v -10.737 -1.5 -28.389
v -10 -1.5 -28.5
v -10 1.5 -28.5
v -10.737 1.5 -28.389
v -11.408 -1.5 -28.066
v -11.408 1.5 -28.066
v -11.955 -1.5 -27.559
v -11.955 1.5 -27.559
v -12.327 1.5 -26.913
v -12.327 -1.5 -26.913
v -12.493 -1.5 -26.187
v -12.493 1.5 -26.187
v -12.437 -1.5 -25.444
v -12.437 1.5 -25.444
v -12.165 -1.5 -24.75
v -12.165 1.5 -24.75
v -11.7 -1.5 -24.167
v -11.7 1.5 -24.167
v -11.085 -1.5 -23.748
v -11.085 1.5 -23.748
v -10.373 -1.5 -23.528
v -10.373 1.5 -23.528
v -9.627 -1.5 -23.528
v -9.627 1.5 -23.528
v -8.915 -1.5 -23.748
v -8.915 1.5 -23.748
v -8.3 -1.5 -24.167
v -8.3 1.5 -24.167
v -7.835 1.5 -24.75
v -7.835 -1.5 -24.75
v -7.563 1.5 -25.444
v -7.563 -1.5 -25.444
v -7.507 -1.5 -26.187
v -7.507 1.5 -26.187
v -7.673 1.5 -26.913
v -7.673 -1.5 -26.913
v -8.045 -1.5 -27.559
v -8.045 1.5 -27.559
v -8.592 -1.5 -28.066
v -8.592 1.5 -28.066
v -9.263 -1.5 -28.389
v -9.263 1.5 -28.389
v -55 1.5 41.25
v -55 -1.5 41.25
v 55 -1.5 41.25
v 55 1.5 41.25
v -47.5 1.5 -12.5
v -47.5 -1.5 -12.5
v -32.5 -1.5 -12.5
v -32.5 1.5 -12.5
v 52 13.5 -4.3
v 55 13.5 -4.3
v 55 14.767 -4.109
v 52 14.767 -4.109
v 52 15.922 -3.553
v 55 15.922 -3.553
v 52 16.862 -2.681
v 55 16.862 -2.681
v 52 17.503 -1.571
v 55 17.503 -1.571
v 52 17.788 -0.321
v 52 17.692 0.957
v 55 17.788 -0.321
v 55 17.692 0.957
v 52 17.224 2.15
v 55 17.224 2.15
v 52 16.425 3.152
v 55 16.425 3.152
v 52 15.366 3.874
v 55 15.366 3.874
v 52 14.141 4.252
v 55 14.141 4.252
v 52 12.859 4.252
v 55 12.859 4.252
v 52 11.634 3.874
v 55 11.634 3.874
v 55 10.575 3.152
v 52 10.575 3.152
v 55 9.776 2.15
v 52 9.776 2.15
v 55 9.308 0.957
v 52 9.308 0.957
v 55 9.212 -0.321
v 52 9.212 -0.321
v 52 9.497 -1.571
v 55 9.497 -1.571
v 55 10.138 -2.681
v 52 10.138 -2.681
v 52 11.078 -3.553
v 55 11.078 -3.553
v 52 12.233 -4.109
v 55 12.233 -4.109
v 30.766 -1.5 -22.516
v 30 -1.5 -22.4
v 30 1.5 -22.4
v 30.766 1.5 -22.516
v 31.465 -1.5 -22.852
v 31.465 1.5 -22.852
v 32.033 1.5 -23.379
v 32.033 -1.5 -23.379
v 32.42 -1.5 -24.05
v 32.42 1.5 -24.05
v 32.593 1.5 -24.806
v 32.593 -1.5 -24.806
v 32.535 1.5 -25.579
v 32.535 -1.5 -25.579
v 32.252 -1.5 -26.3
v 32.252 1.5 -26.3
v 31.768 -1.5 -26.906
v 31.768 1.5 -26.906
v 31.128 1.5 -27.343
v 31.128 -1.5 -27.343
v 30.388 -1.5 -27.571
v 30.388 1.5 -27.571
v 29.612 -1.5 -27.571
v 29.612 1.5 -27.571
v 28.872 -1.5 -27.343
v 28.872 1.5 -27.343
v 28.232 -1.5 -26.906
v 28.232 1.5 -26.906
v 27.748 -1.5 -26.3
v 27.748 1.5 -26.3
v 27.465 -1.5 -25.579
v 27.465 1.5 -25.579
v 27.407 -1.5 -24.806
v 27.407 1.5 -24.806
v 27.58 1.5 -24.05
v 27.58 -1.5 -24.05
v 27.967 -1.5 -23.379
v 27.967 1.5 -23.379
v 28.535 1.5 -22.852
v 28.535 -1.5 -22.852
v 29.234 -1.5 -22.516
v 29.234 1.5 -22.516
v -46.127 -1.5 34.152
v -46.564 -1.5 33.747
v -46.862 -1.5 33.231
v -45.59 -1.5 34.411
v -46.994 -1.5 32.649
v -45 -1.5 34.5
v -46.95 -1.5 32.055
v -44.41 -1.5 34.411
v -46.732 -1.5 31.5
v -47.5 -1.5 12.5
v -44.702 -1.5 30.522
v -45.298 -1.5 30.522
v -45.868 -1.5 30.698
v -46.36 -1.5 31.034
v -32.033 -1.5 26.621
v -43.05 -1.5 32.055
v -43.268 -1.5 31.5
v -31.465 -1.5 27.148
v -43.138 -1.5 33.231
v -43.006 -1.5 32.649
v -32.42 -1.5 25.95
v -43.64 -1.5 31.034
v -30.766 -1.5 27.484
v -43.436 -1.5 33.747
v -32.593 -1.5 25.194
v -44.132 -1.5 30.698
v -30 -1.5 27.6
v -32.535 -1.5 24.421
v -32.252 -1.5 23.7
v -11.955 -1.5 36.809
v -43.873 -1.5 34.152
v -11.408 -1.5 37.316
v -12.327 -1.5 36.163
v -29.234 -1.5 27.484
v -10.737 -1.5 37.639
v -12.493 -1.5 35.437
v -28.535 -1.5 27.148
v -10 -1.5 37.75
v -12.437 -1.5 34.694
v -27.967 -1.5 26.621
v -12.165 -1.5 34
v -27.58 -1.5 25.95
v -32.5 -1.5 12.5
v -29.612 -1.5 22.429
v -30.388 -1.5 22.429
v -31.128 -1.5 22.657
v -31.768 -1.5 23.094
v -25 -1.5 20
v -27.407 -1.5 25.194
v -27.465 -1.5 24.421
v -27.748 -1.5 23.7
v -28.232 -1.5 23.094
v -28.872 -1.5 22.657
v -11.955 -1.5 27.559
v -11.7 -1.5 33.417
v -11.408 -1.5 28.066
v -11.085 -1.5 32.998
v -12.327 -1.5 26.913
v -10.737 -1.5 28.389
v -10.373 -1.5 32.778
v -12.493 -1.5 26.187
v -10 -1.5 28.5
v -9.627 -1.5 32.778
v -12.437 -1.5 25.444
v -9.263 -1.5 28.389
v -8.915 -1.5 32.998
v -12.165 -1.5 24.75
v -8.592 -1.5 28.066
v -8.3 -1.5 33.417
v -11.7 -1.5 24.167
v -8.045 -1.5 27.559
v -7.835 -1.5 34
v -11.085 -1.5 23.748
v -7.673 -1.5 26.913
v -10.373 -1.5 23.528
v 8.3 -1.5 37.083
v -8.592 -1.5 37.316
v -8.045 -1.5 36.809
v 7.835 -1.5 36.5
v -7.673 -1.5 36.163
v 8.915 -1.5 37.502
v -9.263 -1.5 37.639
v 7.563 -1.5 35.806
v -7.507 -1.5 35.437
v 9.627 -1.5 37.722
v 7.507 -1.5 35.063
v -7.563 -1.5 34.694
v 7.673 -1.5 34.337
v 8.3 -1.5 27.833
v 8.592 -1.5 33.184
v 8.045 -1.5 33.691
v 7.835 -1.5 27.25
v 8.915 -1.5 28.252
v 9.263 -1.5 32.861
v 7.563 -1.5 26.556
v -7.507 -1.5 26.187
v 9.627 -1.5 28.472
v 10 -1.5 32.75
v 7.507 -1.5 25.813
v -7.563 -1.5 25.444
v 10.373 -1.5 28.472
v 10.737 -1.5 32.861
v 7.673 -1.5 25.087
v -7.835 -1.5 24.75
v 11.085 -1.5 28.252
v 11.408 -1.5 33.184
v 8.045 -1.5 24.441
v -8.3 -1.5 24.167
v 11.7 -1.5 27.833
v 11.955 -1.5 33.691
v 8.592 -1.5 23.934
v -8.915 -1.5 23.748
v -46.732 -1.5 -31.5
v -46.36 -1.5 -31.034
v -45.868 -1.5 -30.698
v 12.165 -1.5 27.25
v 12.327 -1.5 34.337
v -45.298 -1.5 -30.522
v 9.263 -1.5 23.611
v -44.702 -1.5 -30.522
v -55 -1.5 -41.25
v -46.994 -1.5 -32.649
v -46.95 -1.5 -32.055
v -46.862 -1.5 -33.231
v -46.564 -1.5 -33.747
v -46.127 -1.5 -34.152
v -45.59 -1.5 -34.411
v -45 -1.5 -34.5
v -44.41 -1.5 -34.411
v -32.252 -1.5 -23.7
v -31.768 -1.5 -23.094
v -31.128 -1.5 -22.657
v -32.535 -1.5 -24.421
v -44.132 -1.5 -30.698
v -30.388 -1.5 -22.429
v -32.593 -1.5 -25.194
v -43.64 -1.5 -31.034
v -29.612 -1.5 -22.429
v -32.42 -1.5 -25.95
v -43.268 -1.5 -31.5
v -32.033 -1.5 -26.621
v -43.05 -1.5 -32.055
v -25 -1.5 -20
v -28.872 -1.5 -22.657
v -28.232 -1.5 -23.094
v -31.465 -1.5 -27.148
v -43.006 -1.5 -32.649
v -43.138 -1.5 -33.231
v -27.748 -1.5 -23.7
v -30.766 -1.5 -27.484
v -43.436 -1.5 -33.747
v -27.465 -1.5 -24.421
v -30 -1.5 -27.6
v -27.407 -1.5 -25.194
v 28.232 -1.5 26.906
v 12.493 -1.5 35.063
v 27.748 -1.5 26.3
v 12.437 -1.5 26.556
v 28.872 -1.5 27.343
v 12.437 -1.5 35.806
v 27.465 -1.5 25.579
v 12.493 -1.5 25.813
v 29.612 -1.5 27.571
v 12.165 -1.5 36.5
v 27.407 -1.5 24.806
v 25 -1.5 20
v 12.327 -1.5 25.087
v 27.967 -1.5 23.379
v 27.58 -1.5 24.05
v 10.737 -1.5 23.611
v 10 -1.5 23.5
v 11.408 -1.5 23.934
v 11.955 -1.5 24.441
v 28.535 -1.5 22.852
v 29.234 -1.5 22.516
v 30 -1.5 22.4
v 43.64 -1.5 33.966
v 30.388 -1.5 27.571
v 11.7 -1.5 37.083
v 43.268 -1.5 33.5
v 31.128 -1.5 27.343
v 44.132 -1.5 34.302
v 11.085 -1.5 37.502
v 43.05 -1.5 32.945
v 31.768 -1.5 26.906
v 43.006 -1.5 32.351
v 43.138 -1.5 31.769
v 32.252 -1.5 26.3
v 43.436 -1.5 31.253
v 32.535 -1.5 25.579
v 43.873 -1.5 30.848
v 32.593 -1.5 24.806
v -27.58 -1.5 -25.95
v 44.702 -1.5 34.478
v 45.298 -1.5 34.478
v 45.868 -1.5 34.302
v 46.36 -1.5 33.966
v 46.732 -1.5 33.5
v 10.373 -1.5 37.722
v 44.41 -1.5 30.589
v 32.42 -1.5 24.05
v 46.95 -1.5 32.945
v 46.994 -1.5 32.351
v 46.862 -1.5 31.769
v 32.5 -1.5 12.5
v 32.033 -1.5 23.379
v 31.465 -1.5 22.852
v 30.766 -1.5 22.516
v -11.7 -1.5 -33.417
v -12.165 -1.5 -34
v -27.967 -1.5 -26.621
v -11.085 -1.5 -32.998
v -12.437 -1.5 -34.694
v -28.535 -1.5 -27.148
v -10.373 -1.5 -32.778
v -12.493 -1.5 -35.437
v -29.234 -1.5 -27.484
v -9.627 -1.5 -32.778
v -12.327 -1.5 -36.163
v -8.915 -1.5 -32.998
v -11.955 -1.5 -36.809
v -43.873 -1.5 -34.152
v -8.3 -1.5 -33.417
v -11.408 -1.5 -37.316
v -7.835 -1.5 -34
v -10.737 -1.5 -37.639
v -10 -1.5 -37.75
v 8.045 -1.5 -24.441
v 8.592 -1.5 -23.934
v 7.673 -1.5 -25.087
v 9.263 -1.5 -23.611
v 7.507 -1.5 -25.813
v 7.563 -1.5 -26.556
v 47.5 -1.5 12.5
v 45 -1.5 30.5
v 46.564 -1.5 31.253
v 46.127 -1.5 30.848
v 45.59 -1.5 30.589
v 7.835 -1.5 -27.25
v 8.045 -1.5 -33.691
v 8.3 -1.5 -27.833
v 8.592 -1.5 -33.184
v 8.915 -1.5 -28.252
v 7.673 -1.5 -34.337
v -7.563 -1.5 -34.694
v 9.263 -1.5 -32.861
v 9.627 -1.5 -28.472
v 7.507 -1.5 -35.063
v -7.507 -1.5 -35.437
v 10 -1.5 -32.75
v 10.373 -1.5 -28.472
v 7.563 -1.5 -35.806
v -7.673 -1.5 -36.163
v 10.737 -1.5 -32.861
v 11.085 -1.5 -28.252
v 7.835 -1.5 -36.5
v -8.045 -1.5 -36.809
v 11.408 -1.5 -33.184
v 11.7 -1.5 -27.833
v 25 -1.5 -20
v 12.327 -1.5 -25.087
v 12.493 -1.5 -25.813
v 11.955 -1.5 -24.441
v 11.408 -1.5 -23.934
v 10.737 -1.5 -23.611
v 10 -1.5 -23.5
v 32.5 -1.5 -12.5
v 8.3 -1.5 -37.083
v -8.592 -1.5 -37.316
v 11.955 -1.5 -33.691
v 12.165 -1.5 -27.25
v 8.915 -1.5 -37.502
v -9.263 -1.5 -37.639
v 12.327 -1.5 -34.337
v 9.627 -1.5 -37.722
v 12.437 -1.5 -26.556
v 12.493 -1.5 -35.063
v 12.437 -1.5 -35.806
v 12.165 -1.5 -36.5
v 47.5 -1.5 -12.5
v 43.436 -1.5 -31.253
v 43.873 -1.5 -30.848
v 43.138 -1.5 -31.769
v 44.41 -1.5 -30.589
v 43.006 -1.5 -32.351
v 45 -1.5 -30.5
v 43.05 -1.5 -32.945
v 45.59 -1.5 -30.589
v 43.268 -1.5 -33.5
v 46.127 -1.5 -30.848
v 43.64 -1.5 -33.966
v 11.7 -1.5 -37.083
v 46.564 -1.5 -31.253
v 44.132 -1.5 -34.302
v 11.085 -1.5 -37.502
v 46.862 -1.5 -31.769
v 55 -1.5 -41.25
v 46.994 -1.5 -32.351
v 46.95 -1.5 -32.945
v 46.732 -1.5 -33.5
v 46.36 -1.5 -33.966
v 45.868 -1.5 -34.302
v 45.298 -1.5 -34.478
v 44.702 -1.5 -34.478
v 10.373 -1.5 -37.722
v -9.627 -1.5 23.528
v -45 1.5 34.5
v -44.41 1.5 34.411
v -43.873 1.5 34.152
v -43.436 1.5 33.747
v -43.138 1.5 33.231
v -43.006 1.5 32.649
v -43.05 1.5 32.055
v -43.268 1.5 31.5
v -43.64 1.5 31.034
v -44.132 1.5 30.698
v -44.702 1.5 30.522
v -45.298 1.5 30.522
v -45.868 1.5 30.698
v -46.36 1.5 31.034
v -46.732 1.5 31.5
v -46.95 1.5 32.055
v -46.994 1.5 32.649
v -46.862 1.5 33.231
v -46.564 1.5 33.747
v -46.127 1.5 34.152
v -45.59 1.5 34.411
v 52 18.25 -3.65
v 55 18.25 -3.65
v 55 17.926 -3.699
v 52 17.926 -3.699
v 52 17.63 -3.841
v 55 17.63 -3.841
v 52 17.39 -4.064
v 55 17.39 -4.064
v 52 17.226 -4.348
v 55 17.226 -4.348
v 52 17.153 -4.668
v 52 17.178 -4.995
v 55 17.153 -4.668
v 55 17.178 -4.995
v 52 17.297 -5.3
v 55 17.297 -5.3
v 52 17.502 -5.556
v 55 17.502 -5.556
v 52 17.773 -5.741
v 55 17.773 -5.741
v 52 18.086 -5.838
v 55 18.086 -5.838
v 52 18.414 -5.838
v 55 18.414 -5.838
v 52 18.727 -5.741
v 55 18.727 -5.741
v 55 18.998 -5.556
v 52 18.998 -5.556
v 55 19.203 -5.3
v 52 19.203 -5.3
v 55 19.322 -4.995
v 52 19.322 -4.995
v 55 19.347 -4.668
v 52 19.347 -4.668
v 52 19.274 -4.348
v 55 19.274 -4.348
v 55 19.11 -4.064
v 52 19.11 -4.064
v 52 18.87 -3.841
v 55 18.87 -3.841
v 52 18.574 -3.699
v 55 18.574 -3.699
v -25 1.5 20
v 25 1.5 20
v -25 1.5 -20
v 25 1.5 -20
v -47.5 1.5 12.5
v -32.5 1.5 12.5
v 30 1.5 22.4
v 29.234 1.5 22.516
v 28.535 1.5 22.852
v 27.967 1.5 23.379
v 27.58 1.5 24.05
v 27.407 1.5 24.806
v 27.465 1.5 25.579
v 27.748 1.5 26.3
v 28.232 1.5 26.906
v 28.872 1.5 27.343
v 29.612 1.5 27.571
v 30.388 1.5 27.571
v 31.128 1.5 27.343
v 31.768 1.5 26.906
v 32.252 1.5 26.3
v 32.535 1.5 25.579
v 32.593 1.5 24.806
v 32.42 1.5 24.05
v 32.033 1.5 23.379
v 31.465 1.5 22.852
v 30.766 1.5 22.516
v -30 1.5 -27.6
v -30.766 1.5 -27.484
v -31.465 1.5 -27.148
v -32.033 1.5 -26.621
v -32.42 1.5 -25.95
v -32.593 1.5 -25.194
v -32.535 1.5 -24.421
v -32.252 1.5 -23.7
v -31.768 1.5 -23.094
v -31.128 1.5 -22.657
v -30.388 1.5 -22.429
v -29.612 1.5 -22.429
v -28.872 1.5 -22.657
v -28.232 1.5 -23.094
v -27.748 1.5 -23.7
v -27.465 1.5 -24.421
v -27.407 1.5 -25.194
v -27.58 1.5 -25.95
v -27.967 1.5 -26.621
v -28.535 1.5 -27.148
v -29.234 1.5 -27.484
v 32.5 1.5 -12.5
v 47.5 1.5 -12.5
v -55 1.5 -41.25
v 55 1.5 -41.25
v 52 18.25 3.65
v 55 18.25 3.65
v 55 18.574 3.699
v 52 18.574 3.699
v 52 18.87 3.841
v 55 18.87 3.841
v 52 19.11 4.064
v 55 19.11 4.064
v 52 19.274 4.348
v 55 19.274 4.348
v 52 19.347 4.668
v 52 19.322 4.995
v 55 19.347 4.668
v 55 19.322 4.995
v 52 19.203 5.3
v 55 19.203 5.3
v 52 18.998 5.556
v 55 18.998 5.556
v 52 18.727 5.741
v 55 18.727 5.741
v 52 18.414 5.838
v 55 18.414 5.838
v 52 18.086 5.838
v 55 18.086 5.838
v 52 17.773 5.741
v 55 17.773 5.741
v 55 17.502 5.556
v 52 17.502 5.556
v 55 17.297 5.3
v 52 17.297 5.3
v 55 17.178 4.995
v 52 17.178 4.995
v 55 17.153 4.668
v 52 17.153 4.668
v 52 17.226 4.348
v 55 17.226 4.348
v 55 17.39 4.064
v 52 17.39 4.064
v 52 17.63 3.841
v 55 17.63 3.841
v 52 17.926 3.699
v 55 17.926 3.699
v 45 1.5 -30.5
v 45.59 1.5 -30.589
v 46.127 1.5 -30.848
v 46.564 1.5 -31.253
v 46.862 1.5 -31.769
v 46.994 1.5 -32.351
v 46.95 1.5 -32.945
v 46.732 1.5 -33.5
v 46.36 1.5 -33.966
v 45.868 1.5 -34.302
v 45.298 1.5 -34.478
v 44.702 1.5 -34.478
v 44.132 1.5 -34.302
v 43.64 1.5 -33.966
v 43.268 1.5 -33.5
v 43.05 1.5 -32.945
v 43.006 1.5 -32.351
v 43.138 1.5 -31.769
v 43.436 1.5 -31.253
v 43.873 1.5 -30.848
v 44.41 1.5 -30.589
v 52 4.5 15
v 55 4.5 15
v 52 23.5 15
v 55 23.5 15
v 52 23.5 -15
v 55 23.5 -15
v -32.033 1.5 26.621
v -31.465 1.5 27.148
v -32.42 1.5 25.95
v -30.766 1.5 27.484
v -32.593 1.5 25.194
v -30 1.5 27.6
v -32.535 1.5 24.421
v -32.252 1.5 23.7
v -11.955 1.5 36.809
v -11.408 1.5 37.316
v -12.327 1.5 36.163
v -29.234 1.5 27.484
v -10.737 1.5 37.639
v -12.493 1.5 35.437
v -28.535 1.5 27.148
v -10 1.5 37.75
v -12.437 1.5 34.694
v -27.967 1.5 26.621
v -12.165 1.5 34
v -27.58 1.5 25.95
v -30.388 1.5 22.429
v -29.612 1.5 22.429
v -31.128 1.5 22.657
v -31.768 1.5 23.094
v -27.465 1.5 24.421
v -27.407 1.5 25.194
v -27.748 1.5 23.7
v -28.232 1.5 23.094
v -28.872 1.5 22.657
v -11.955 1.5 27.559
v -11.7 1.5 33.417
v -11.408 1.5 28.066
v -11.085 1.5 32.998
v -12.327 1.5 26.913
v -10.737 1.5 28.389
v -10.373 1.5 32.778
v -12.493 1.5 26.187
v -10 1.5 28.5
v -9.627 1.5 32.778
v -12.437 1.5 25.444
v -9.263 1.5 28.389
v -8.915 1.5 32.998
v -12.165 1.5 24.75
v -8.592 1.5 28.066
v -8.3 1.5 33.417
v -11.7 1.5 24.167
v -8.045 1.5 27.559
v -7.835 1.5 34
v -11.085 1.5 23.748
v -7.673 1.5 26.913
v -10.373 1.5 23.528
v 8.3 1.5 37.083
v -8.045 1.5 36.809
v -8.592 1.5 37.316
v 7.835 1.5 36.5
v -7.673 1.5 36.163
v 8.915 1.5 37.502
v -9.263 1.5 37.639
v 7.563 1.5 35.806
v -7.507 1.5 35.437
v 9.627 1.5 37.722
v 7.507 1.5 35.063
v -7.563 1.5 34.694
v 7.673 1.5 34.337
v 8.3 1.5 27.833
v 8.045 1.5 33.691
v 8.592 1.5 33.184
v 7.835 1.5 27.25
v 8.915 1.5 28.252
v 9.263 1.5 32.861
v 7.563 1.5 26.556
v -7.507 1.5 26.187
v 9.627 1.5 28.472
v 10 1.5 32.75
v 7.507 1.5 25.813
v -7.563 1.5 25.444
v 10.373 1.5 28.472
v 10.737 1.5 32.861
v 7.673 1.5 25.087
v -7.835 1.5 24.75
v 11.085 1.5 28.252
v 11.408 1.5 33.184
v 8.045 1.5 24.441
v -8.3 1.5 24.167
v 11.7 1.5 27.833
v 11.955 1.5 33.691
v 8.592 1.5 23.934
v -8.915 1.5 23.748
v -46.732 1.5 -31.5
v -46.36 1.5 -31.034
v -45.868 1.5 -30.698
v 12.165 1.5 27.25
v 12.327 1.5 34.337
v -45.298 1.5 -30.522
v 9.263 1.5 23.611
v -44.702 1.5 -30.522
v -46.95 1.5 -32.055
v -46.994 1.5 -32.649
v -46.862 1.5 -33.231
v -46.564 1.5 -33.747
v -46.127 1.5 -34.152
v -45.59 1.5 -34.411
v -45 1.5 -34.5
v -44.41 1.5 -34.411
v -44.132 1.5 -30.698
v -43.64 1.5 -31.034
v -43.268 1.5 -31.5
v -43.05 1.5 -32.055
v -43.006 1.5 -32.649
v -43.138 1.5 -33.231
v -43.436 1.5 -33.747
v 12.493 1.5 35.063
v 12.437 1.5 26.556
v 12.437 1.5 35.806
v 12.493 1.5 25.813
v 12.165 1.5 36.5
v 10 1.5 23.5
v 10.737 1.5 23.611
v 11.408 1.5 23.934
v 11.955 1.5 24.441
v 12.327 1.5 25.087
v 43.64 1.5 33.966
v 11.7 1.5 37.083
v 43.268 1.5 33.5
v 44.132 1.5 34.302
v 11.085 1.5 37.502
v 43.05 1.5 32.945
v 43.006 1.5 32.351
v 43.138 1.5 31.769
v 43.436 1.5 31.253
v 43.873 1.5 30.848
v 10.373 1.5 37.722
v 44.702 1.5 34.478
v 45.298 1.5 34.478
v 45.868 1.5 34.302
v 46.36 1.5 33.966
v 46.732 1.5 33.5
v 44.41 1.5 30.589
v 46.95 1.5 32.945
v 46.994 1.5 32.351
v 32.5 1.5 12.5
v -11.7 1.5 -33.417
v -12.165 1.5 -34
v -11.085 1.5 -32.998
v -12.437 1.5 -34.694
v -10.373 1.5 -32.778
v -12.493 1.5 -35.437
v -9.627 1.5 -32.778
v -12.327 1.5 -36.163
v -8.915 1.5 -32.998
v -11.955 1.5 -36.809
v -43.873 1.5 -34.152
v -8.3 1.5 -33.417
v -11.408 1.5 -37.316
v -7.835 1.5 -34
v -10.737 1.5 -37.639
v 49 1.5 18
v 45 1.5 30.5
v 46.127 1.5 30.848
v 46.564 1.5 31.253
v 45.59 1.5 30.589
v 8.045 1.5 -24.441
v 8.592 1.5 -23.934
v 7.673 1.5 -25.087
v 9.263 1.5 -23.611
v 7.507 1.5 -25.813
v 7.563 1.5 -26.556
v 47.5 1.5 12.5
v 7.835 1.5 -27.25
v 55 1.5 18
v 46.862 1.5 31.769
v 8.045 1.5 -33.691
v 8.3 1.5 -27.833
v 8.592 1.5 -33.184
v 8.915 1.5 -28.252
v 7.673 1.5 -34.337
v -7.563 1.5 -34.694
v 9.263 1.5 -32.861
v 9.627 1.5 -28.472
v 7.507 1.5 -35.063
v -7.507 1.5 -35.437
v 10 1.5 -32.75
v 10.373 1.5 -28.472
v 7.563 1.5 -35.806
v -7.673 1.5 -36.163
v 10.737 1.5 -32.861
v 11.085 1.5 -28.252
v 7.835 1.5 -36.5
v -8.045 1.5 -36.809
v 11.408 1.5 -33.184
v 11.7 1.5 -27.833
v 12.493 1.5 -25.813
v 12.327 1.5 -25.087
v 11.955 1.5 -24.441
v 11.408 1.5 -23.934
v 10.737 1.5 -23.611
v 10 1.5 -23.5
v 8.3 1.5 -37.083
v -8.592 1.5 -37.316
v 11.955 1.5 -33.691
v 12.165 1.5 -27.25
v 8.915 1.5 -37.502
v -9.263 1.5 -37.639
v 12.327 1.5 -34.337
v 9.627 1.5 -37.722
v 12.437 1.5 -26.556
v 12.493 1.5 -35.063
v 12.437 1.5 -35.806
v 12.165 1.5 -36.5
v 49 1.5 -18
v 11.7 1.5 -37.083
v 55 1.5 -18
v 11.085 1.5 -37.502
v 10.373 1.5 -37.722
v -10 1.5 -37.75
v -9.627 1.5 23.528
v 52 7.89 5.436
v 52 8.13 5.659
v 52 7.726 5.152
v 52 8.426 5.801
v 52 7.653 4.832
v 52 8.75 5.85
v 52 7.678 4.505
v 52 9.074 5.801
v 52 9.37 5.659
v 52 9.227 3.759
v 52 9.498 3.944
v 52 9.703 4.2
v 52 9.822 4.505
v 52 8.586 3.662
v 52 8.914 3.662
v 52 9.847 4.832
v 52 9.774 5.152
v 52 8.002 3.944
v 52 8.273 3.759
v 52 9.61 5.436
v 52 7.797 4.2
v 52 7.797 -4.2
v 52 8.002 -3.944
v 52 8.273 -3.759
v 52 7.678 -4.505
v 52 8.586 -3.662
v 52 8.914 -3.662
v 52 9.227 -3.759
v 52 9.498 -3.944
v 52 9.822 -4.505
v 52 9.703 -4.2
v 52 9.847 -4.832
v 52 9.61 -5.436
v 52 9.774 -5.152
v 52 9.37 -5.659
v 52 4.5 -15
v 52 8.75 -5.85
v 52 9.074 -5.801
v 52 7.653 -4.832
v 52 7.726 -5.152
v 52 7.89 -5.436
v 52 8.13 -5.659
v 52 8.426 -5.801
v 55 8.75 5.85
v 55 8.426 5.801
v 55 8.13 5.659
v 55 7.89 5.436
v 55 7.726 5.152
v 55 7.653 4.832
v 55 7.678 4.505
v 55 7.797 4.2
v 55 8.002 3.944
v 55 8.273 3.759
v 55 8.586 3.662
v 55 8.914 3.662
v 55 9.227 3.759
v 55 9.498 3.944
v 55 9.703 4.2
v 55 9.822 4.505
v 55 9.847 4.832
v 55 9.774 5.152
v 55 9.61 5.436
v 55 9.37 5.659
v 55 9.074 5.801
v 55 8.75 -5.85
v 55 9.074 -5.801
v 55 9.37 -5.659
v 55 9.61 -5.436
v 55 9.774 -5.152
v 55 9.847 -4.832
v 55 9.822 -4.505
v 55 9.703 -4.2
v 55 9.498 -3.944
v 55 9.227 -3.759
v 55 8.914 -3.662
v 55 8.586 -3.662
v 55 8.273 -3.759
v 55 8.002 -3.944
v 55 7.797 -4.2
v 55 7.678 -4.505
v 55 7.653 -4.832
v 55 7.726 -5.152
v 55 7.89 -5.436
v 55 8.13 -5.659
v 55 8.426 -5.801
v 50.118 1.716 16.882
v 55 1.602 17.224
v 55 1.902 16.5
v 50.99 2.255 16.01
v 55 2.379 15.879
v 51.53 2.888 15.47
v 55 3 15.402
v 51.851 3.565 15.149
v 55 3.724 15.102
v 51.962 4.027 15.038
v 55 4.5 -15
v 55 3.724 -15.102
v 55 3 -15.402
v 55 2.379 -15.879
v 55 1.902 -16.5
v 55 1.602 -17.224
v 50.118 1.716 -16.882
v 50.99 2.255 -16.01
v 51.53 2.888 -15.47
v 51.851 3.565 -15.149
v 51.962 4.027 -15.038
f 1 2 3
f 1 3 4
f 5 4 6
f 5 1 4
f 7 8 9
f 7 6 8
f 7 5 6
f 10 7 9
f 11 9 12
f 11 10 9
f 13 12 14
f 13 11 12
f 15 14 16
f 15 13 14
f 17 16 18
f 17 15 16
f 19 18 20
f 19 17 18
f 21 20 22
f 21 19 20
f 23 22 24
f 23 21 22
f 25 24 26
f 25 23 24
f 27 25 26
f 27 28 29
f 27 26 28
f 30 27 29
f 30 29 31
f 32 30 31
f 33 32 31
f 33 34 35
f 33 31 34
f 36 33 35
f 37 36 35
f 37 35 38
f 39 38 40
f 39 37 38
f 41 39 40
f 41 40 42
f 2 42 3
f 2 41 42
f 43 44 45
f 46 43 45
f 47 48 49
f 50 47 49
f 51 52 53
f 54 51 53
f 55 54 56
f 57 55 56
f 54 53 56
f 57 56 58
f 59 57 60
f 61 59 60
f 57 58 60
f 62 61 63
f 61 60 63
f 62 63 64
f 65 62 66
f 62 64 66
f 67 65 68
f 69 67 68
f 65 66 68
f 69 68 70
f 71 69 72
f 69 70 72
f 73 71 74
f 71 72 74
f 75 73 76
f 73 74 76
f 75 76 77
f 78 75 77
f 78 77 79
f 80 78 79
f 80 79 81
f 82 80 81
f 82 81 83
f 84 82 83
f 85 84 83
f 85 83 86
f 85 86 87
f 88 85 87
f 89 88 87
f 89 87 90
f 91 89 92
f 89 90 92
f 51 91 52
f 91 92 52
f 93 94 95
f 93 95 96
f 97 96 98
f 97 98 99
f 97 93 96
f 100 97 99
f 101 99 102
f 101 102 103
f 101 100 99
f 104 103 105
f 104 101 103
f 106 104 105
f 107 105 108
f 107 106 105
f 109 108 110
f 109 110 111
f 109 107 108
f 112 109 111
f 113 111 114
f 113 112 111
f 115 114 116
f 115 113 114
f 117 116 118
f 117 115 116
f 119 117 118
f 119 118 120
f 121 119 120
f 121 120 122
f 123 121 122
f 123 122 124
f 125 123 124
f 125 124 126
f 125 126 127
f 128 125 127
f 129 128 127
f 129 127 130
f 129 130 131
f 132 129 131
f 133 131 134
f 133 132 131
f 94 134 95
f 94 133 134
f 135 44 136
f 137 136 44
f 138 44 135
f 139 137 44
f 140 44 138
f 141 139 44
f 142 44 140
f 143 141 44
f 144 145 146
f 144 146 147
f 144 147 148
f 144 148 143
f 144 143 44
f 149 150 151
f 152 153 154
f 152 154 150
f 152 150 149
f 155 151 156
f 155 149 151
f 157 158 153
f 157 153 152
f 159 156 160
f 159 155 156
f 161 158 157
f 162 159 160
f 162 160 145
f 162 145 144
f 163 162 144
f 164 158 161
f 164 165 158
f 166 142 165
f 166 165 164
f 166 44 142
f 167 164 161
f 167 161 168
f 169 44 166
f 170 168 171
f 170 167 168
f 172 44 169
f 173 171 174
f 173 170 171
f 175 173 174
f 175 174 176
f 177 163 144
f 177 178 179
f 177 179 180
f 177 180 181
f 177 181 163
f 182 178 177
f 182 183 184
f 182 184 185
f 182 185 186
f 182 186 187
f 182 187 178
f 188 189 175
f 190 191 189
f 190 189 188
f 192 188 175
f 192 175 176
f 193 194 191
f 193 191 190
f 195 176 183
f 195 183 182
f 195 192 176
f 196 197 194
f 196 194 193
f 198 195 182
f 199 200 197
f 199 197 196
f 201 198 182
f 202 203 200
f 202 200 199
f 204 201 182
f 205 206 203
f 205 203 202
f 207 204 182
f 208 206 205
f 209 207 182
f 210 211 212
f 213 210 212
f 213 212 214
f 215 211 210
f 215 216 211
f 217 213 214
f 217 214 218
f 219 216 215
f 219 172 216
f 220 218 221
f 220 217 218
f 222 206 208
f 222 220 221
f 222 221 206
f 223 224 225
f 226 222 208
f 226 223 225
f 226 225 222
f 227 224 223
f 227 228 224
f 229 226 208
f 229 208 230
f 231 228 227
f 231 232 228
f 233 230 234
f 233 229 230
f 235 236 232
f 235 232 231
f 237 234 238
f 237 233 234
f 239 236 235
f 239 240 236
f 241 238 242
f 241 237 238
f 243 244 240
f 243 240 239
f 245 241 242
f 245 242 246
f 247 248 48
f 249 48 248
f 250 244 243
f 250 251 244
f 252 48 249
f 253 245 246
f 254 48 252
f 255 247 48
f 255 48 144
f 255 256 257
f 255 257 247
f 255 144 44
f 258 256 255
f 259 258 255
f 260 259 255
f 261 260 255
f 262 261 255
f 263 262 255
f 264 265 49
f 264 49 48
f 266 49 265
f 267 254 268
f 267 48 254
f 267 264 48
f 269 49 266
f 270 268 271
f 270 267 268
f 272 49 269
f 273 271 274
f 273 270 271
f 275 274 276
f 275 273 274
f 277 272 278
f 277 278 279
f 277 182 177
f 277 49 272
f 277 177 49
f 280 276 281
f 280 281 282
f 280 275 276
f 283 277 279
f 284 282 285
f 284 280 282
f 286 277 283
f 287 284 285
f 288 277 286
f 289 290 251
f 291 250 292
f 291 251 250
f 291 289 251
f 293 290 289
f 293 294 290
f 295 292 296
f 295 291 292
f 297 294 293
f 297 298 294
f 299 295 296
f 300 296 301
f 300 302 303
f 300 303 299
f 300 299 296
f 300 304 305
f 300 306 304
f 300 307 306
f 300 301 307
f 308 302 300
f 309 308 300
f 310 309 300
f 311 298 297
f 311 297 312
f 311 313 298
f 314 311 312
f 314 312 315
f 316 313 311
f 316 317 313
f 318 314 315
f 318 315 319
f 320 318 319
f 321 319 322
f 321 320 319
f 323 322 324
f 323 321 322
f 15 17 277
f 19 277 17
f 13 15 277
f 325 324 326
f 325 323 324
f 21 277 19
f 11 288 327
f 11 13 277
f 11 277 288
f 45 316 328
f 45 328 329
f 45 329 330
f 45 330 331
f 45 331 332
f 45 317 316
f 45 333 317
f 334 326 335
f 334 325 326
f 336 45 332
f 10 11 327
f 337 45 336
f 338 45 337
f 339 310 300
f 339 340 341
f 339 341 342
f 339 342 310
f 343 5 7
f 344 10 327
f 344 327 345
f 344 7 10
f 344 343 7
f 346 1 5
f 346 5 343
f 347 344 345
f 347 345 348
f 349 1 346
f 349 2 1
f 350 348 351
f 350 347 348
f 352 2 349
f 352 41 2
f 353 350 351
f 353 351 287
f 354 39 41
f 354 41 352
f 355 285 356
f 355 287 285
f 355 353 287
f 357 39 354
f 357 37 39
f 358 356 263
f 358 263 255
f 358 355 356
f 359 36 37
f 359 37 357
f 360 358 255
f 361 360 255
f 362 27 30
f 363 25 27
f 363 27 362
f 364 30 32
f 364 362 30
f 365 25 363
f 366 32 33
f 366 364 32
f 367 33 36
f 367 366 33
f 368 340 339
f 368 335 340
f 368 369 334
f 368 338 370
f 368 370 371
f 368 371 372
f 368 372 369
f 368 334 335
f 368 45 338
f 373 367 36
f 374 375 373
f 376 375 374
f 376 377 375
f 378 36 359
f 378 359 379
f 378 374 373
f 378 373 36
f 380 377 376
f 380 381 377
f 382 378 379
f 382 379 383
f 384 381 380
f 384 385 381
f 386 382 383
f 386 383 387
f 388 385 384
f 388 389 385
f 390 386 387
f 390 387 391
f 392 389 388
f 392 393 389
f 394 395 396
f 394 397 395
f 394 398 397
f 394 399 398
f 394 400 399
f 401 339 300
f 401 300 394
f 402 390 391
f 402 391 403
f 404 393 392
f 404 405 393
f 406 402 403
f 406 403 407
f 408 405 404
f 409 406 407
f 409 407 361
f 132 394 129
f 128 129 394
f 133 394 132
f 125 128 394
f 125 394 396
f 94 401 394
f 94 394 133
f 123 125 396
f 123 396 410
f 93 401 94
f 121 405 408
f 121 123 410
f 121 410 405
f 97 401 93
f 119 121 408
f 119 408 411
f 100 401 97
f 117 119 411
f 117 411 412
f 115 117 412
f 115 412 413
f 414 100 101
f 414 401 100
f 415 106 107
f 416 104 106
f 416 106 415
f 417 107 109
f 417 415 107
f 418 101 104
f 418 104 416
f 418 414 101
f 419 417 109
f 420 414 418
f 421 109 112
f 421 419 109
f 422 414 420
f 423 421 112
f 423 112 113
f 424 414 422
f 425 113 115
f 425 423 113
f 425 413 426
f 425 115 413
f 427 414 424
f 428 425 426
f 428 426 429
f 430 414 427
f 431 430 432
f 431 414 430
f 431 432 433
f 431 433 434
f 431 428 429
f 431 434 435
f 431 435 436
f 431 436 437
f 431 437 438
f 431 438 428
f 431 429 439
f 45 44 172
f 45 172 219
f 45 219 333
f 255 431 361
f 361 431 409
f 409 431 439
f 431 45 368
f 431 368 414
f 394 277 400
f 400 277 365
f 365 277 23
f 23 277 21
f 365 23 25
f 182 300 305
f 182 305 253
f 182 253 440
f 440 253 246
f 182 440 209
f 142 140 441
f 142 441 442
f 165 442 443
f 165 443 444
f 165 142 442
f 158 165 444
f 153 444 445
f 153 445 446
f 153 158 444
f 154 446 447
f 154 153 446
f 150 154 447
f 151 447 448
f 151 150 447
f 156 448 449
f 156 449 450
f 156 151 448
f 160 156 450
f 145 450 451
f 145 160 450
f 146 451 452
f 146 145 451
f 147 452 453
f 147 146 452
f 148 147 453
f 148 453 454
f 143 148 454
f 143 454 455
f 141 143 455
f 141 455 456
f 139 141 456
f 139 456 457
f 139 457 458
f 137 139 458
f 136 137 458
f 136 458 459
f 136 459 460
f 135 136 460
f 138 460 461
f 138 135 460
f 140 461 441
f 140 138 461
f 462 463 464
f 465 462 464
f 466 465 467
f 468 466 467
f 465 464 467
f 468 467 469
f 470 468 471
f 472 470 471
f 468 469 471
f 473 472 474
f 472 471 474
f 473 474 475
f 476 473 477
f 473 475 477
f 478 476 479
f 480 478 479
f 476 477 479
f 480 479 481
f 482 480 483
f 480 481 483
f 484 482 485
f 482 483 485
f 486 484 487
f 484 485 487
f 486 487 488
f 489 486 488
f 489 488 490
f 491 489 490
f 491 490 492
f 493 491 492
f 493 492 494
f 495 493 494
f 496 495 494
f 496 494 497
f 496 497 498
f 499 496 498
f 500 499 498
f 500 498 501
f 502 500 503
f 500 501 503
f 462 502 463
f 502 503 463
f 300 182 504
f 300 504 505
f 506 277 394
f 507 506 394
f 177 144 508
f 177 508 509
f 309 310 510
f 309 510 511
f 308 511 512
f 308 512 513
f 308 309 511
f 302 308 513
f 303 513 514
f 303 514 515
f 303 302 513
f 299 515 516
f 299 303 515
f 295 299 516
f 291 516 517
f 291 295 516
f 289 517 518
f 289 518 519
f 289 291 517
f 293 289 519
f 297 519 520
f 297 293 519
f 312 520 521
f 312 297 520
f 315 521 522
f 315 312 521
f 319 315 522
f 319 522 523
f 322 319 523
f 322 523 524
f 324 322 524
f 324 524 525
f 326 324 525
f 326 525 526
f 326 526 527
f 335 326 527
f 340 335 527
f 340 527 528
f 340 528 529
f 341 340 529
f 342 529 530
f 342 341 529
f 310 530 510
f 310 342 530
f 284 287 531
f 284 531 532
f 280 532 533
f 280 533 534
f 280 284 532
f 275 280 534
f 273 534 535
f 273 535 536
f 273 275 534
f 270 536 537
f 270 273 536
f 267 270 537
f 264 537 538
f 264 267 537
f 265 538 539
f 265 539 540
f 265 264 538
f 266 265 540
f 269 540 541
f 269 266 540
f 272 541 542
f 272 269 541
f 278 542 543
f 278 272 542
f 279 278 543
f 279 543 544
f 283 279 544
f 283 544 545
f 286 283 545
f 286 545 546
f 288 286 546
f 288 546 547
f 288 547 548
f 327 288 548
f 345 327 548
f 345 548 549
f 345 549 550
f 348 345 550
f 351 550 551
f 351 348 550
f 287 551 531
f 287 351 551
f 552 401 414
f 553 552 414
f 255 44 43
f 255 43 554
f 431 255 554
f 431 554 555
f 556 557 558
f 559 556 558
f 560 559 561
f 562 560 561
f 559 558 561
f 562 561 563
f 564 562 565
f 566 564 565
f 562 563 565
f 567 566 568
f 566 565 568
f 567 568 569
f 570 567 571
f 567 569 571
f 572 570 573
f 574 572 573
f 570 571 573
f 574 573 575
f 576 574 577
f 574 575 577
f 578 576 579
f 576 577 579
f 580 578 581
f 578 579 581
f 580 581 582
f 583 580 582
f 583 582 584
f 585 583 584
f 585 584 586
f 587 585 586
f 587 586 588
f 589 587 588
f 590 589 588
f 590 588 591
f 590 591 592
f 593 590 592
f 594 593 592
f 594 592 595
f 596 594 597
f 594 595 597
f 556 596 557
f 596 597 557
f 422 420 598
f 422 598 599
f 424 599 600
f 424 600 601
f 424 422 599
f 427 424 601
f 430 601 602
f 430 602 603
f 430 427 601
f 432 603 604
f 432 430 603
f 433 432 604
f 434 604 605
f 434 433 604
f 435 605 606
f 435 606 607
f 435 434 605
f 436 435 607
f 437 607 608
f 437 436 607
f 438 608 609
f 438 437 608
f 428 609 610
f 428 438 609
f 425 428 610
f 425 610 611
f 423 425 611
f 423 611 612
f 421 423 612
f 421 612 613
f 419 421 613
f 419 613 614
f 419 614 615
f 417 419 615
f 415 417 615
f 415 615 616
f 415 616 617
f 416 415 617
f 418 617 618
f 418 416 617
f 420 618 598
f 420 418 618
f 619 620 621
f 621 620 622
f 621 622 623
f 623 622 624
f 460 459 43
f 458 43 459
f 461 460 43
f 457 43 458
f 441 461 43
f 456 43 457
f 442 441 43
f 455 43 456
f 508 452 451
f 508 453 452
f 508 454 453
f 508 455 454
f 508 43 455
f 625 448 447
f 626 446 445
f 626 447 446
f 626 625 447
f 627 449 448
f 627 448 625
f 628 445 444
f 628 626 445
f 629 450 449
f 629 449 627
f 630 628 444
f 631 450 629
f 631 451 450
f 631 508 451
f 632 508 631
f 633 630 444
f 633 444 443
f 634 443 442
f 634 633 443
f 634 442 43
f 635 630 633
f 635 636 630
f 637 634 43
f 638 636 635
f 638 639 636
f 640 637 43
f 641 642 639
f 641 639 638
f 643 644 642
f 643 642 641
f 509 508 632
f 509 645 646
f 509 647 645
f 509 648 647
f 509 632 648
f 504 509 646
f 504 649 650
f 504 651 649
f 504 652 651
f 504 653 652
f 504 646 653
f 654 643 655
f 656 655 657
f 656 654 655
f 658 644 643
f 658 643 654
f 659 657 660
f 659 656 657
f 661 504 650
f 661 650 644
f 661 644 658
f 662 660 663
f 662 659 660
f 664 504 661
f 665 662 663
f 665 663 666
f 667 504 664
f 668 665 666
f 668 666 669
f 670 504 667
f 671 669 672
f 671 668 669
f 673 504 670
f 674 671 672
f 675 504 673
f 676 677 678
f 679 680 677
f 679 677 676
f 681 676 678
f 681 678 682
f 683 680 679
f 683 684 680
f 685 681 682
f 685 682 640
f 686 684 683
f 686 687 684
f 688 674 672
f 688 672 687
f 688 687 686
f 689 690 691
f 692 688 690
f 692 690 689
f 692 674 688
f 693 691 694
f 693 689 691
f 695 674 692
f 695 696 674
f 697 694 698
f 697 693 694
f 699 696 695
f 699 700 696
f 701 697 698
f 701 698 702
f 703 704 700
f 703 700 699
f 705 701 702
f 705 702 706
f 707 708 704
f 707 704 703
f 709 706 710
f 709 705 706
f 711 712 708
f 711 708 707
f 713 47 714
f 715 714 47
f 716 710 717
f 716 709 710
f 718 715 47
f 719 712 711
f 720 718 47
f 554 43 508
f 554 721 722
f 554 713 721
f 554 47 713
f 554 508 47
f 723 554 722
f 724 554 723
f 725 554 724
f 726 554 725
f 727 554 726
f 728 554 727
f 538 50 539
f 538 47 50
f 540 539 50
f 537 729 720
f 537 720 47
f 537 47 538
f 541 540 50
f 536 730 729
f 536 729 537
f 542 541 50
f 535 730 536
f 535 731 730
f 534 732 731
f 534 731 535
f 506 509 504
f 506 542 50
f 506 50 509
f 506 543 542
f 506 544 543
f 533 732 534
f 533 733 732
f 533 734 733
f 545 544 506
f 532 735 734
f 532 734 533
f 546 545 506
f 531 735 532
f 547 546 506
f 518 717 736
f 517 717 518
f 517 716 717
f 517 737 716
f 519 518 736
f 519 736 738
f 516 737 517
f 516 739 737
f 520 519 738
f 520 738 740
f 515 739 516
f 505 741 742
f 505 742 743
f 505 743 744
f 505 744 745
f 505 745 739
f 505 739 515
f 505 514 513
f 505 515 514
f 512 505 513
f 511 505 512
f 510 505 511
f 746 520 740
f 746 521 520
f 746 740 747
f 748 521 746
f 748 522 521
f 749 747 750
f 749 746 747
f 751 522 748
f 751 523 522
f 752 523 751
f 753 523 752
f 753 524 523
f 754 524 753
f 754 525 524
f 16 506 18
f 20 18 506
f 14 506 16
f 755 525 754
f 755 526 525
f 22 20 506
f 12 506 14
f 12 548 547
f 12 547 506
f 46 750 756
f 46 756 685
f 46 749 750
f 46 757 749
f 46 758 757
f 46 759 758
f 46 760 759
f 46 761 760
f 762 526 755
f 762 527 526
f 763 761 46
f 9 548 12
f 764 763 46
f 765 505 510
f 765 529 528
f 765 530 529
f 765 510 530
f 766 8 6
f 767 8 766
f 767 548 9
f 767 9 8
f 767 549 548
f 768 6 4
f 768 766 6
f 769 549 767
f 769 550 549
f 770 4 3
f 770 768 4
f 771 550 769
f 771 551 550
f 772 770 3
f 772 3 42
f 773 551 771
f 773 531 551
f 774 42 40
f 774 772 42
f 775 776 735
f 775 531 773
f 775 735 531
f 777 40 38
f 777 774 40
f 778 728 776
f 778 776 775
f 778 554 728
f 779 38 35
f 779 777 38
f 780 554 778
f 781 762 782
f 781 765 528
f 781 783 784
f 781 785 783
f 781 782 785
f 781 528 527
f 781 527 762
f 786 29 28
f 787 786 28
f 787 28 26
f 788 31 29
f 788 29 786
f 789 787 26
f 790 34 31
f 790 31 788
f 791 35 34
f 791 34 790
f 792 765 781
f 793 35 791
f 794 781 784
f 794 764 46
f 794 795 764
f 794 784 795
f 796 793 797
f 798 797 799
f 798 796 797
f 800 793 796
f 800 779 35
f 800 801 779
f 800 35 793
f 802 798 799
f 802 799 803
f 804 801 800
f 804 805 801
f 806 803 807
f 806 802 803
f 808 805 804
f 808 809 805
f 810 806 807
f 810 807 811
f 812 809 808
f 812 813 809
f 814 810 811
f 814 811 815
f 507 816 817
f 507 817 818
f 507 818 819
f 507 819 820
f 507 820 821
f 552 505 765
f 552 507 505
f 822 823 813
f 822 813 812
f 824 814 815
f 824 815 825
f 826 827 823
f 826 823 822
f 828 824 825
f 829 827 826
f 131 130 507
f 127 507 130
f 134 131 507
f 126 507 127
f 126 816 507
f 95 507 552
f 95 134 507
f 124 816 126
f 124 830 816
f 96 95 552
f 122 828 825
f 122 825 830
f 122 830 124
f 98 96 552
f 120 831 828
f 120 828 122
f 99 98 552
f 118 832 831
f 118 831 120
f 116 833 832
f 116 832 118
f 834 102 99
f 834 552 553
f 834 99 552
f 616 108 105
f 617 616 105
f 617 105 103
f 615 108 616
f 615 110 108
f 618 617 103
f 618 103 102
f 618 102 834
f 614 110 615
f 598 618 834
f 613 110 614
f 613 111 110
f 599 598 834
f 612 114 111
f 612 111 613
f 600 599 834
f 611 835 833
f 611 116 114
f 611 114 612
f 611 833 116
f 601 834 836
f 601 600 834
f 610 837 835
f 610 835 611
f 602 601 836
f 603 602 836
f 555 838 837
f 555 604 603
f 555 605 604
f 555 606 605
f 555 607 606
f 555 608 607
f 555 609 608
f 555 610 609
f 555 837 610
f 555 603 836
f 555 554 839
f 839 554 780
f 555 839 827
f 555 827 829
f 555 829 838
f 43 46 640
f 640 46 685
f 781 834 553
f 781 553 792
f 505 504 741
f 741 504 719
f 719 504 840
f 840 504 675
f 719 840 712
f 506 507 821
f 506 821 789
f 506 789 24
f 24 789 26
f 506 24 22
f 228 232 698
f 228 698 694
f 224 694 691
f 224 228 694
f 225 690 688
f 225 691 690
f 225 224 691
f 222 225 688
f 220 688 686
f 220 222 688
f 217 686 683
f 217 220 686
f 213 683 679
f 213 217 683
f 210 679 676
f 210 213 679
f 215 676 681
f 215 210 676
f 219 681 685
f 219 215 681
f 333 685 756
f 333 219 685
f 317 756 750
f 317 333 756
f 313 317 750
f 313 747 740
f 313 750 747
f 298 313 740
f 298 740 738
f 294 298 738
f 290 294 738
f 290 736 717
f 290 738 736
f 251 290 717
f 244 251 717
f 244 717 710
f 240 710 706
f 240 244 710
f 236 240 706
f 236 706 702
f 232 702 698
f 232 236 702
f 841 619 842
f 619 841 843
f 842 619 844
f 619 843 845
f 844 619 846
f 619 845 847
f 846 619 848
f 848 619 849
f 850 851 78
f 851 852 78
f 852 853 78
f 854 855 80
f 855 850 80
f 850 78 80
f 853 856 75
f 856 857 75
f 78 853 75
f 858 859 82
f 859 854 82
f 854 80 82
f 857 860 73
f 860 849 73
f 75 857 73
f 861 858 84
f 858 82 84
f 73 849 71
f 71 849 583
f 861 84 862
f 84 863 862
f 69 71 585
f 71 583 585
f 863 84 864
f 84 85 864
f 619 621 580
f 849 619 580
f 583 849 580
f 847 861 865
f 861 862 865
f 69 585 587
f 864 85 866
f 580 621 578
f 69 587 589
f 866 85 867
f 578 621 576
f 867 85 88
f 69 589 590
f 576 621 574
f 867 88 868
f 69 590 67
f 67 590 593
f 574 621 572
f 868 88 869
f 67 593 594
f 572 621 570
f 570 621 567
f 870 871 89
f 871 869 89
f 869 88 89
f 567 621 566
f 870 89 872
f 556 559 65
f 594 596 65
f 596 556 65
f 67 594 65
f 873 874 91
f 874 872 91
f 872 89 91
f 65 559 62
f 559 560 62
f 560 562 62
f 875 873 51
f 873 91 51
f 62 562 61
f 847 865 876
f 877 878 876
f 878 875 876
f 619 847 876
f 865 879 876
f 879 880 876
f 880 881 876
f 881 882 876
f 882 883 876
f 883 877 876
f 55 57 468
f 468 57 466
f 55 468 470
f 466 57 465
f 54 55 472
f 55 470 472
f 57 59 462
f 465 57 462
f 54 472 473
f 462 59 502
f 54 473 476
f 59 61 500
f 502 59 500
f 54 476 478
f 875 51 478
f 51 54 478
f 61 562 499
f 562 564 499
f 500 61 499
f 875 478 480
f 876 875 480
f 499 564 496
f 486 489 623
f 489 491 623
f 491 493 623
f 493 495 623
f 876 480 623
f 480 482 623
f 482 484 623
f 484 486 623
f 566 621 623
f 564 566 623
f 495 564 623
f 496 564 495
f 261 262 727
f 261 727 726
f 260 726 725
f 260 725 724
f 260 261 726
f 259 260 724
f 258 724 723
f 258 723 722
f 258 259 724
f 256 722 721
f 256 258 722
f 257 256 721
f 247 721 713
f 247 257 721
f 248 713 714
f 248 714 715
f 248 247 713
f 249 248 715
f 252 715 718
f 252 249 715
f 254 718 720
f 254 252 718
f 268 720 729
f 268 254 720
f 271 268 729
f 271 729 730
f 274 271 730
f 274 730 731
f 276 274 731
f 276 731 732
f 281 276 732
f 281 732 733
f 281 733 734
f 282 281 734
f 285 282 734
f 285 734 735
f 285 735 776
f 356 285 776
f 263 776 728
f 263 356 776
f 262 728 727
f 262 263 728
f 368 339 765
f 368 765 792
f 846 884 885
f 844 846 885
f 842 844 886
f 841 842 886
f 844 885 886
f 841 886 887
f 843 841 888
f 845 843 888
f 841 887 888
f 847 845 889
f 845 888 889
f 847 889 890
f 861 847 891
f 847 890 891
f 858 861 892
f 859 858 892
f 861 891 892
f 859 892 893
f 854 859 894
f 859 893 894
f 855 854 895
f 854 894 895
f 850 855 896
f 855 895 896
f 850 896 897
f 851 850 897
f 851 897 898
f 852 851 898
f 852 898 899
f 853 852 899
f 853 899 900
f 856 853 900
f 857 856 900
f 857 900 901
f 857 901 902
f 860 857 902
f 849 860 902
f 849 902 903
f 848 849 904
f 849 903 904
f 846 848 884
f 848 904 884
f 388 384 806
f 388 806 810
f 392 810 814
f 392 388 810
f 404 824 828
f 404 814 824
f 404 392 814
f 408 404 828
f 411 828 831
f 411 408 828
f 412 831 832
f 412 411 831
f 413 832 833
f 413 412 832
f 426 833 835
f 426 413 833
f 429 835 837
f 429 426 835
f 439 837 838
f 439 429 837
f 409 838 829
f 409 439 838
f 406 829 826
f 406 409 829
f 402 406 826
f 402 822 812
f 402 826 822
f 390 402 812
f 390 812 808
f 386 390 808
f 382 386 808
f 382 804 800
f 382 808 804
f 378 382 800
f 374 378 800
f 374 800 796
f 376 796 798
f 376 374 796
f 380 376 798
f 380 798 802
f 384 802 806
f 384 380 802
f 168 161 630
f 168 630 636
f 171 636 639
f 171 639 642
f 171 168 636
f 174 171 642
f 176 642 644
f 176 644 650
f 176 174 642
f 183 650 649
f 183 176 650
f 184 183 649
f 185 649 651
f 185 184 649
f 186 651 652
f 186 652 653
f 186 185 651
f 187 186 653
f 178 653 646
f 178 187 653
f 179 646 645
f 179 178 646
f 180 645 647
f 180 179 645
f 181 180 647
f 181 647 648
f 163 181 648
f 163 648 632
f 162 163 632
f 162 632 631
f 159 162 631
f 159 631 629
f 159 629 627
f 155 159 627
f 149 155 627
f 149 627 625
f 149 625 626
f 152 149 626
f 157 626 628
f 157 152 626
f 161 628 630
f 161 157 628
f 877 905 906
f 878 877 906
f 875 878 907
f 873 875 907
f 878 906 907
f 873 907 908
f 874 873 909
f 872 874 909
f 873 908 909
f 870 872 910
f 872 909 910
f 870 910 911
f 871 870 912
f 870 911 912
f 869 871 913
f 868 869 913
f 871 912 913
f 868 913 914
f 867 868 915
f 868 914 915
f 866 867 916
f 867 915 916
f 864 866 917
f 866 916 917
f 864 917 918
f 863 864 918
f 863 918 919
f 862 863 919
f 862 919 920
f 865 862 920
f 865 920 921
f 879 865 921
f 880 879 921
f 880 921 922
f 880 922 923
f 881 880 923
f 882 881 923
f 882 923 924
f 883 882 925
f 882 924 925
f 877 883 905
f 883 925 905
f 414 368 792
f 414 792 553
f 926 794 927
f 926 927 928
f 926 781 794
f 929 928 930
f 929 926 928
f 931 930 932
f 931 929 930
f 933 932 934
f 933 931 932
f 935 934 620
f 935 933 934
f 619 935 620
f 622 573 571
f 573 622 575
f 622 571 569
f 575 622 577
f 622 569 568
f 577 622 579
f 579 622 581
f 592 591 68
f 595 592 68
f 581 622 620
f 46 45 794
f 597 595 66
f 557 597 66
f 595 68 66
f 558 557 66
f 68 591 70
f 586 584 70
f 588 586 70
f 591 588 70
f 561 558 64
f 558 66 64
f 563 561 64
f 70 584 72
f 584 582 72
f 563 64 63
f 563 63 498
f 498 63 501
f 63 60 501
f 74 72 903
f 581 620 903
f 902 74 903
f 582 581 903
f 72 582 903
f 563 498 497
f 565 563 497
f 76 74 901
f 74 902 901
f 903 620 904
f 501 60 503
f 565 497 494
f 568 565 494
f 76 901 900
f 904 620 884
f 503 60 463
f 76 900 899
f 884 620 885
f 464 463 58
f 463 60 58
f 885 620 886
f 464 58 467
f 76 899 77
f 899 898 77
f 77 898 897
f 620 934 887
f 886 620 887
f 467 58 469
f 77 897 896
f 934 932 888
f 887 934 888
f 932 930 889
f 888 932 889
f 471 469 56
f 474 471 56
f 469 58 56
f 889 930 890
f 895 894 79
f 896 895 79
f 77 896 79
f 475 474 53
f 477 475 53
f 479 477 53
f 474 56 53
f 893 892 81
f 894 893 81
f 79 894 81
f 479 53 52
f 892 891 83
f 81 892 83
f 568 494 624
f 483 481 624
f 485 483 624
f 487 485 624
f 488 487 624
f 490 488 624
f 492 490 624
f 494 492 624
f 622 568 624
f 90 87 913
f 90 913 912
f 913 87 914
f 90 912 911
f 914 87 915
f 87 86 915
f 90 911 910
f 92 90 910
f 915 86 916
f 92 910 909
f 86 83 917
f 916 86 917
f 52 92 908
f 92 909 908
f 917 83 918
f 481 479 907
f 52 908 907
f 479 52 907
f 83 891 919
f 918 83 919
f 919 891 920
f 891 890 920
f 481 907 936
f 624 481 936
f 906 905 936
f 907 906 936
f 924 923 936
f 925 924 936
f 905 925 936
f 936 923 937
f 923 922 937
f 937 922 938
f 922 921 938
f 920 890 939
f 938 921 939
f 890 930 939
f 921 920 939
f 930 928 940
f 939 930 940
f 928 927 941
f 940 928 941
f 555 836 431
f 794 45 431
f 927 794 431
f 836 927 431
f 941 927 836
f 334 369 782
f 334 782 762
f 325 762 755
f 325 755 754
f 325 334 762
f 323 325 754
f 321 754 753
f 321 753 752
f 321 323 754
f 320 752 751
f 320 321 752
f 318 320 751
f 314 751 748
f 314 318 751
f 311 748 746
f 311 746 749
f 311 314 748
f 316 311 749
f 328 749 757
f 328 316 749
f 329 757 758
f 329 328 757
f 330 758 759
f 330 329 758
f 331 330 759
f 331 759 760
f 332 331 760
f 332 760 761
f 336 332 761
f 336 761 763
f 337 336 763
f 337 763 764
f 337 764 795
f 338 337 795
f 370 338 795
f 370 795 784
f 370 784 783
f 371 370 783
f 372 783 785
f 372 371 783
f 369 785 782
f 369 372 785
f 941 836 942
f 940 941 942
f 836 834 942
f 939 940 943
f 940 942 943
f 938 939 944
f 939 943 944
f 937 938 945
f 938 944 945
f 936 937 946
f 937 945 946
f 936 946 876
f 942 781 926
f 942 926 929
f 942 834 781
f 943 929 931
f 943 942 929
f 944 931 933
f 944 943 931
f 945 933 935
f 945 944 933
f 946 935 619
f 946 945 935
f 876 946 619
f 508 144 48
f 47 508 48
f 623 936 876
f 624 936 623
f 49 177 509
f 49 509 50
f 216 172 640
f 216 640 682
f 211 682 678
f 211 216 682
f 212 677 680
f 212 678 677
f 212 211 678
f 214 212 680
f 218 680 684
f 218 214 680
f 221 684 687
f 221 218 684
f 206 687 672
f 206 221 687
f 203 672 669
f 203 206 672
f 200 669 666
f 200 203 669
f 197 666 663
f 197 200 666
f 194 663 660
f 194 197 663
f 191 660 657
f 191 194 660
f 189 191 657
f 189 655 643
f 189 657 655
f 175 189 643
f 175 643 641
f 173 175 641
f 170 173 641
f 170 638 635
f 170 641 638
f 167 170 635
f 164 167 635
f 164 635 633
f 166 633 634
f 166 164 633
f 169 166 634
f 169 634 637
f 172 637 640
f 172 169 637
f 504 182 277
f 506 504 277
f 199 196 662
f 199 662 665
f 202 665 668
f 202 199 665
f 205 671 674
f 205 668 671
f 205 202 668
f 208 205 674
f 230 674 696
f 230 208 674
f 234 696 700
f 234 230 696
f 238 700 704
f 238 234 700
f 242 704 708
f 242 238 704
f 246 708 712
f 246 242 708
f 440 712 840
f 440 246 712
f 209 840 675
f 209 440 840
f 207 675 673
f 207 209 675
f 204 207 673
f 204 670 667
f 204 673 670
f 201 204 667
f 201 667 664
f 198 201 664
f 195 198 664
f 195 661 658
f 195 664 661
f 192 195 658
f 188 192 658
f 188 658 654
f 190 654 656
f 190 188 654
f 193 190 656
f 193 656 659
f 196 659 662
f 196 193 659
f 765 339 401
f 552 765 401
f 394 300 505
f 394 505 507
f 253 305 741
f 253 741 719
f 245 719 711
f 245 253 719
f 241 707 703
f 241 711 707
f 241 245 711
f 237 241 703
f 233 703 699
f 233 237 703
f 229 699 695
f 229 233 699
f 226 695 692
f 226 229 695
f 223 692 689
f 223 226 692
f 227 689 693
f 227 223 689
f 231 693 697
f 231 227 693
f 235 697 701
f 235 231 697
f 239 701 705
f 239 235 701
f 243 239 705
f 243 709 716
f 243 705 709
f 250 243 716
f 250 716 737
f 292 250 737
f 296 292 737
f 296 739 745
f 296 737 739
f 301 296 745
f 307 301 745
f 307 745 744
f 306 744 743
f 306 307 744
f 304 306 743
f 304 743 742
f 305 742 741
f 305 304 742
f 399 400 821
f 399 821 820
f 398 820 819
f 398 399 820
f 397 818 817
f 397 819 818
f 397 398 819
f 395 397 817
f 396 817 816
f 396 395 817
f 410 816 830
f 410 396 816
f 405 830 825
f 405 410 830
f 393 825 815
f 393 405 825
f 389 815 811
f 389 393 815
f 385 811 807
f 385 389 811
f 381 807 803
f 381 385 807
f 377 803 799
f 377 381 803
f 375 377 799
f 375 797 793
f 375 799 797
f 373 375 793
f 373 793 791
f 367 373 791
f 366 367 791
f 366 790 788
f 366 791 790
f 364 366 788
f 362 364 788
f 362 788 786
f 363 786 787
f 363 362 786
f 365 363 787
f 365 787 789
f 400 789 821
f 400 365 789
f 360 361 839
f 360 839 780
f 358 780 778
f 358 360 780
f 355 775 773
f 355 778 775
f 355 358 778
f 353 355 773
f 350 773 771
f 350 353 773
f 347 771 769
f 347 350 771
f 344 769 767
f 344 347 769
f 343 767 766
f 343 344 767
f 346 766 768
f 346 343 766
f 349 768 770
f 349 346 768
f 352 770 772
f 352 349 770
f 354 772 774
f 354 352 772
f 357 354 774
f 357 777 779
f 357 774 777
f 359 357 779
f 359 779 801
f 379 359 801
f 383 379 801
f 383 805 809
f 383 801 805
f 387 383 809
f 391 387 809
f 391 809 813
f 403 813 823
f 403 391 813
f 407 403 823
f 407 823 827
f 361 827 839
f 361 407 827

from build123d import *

# Parameters (mm, degrees)
BOSS_EXTRUDE1_DEPTH                           = 1.5
BOSS_EXTRUDE1_DEPTH_BACK                      = 1.5
SKETCH1_W                                     = 110
SKETCH1_H                                     = 82.5
SKETCH1_R                                     = 2
SKETCH1_R_2                                   = 2.6
SKETCH1_W_2                                   = 50
SKETCH1_H_2                                   = 40
SKETCH2_W                                     = 30
SKETCH2_H                                     = 25
SKETCH2_R                                     = 4.3
SKETCH2_R_2                                   = 1.1
BOSS_EXTRUDE2_DEPTH                           = 3
FILLET1_R                                     = 3
ZIP_TIE_HOLES_AND_WEIGHT_REDUCTION_DEPTH      = 73.655436823
ZIP_TIE_HOLES_AND_WEIGHT_REDUCTION_DEPTH_BACK = 73.655436823
SKETCH3_R                                     = 2.5
SKETCH3_W                                     = 15
SKETCH3_H                                     = 25


with BuildPart() as part:
    # Sketch1 → Boss-Extrude1 (new, two sides: drawn at the far end of the back side and taken through both)
    with BuildSketch(Plane(origin=(0, 0, 0), x_dir=(1, 0, 0), z_dir=(0, 1, 0)).offset(-BOSS_EXTRUDE1_DEPTH_BACK)):
        Rectangle(SKETCH1_W, SKETCH1_H)
        with Locations((45, 32.5)):
            Circle(SKETCH1_R, mode=Mode.SUBTRACT)
        with Locations((45, -32.5)):
            Circle(SKETCH1_R, mode=Mode.SUBTRACT)
        with Locations((-45, -32.5)):
            Circle(SKETCH1_R, mode=Mode.SUBTRACT)
        with Locations((-45, 32.5)):
            Circle(SKETCH1_R, mode=Mode.SUBTRACT)
        with Locations((-30, -25)):
            Circle(SKETCH1_R_2, mode=Mode.SUBTRACT)
        with Locations((30, -25)):
            Circle(SKETCH1_R_2, mode=Mode.SUBTRACT)
        with Locations((-30, 25)):
            Circle(SKETCH1_R_2, mode=Mode.SUBTRACT)
        with Locations((30, 25)):
            Circle(SKETCH1_R_2, mode=Mode.SUBTRACT)
        Rectangle(SKETCH1_W_2, SKETCH1_H_2, mode=Mode.SUBTRACT)
    extrude(amount=BOSS_EXTRUDE1_DEPTH + BOSS_EXTRUDE1_DEPTH_BACK)

    # Sketch2 → Boss-Extrude2 (add)
    with BuildSketch(Plane(origin=(55, 0, 0), x_dir=(0, 0, -1), z_dir=(1, 0, 0))):
        with Locations((0, 11)):
            Rectangle(SKETCH2_W, SKETCH2_H)
        with Locations((0, 13.5)):
            Circle(SKETCH2_R, mode=Mode.SUBTRACT)
        with Locations((-4.75, 18.25)):
            Circle(SKETCH2_R_2, mode=Mode.SUBTRACT)
        with Locations((4.75, 18.25)):
            Circle(SKETCH2_R_2, mode=Mode.SUBTRACT)
        with Locations((4.75, 8.75)):
            Circle(SKETCH2_R_2, mode=Mode.SUBTRACT)
        with Locations((-4.75, 8.75)):
            Circle(SKETCH2_R_2, mode=Mode.SUBTRACT)
    extrude(amount=-BOSS_EXTRUDE2_DEPTH)

    # Fillet1
    fillet1_edges = [part.edges().sort_by_distance(p)[0] for p in [
        (53.5, 1.5, 15),
        (53.5, 1.5, -15),
        (52, 1.5, 0),
    ]]
    fillet(fillet1_edges, radius=FILLET1_R)

    # Sketch3 → Zip tie holes and weight reduction (cut, two sides: drawn at the far end of the back side and taken through both)
    with BuildSketch(Plane(origin=(0, 0, 0), x_dir=(1, 0, 0), z_dir=(0, 1, 0)).offset(-ZIP_TIE_HOLES_AND_WEIGHT_REDUCTION_DEPTH_BACK)):
        with Locations((-10, -35.25)):
            Circle(SKETCH3_R)
        with Locations((-10, -26)):
            Circle(SKETCH3_R)
        with Locations((10, -26)):
            Circle(SKETCH3_R)
        with Locations((10, -35.25)):
            Circle(SKETCH3_R)
        with Locations((-10, 35.25)):
            Circle(SKETCH3_R)
        with Locations((-10, 26)):
            Circle(SKETCH3_R)
        with Locations((10, 26)):
            Circle(SKETCH3_R)
        with Locations((10, 35.25)):
            Circle(SKETCH3_R)
        with Locations((40, 0)):
            Rectangle(SKETCH3_W, SKETCH3_H)
        with Locations((-40, 0)):
            Rectangle(SKETCH3_W, SKETCH3_H)
    extrude(amount=ZIP_TIE_HOLES_AND_WEIGHT_REDUCTION_DEPTH + ZIP_TIE_HOLES_AND_WEIGHT_REDUCTION_DEPTH_BACK, mode=Mode.SUBTRACT)


solid = part.part
